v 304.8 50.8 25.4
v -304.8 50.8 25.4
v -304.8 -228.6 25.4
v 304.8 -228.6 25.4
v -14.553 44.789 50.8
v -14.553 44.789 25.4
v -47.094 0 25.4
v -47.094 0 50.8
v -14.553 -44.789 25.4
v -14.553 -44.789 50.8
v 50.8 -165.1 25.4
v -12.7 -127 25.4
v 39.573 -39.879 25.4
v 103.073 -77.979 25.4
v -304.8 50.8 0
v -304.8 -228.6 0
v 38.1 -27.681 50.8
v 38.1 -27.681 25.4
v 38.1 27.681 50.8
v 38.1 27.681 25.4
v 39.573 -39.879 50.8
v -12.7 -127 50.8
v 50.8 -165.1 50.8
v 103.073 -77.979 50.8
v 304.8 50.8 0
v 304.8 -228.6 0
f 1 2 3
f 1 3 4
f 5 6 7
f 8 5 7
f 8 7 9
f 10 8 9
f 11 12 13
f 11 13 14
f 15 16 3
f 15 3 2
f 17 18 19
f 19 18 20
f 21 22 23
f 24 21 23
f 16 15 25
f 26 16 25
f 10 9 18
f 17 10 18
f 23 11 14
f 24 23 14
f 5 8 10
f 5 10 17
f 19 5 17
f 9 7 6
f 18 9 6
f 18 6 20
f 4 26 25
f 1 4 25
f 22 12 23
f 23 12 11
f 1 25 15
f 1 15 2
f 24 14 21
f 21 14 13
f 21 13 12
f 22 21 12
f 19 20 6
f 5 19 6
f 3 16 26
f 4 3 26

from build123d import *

# Parameters (mm, degrees)
F0_W     = 609.6
F0_H     = 457.2
F1_DEPTH = 25.4
F3_DEPTH = 25.4
F4_W     = 177.8
F4_H     = 25.4
F5_DEPTH = 609.601


with BuildPart() as f1:
    # F0 (on Top) → F1 (new body)
    with BuildSketch(Plane.XY):
        Rectangle(F0_W, F0_H)
    extrude(amount=F1_DEPTH)

    # F4 (on face) → F5 (cut, through all)
    with BuildSketch(Plane.YZ.offset(304.8)):
        with Locations((139.7, 12.7)):
            Rectangle(F4_W, F4_H)
    extrude(amount=-F5_DEPTH, mode=Mode.SUBTRACT)


with BuildPart() as f3:
    # F2 (on face) → F3 (new body)
    with BuildSketch(Plane.XY.offset(25.4)):
        Polygon((-12.7, -127), (50.8, -165.1), (103.072769, -77.978719), (39.572769, -39.878719), align=None)
        Polygon((38.1, -27.68127), (38.1, 27.68127), (-14.552905, 44.789236), (-47.09419, 0), (-14.552905, -44.789236), align=None)
    extrude(amount=F3_DEPTH)


solid = Compound([f1.part, f3.part])
